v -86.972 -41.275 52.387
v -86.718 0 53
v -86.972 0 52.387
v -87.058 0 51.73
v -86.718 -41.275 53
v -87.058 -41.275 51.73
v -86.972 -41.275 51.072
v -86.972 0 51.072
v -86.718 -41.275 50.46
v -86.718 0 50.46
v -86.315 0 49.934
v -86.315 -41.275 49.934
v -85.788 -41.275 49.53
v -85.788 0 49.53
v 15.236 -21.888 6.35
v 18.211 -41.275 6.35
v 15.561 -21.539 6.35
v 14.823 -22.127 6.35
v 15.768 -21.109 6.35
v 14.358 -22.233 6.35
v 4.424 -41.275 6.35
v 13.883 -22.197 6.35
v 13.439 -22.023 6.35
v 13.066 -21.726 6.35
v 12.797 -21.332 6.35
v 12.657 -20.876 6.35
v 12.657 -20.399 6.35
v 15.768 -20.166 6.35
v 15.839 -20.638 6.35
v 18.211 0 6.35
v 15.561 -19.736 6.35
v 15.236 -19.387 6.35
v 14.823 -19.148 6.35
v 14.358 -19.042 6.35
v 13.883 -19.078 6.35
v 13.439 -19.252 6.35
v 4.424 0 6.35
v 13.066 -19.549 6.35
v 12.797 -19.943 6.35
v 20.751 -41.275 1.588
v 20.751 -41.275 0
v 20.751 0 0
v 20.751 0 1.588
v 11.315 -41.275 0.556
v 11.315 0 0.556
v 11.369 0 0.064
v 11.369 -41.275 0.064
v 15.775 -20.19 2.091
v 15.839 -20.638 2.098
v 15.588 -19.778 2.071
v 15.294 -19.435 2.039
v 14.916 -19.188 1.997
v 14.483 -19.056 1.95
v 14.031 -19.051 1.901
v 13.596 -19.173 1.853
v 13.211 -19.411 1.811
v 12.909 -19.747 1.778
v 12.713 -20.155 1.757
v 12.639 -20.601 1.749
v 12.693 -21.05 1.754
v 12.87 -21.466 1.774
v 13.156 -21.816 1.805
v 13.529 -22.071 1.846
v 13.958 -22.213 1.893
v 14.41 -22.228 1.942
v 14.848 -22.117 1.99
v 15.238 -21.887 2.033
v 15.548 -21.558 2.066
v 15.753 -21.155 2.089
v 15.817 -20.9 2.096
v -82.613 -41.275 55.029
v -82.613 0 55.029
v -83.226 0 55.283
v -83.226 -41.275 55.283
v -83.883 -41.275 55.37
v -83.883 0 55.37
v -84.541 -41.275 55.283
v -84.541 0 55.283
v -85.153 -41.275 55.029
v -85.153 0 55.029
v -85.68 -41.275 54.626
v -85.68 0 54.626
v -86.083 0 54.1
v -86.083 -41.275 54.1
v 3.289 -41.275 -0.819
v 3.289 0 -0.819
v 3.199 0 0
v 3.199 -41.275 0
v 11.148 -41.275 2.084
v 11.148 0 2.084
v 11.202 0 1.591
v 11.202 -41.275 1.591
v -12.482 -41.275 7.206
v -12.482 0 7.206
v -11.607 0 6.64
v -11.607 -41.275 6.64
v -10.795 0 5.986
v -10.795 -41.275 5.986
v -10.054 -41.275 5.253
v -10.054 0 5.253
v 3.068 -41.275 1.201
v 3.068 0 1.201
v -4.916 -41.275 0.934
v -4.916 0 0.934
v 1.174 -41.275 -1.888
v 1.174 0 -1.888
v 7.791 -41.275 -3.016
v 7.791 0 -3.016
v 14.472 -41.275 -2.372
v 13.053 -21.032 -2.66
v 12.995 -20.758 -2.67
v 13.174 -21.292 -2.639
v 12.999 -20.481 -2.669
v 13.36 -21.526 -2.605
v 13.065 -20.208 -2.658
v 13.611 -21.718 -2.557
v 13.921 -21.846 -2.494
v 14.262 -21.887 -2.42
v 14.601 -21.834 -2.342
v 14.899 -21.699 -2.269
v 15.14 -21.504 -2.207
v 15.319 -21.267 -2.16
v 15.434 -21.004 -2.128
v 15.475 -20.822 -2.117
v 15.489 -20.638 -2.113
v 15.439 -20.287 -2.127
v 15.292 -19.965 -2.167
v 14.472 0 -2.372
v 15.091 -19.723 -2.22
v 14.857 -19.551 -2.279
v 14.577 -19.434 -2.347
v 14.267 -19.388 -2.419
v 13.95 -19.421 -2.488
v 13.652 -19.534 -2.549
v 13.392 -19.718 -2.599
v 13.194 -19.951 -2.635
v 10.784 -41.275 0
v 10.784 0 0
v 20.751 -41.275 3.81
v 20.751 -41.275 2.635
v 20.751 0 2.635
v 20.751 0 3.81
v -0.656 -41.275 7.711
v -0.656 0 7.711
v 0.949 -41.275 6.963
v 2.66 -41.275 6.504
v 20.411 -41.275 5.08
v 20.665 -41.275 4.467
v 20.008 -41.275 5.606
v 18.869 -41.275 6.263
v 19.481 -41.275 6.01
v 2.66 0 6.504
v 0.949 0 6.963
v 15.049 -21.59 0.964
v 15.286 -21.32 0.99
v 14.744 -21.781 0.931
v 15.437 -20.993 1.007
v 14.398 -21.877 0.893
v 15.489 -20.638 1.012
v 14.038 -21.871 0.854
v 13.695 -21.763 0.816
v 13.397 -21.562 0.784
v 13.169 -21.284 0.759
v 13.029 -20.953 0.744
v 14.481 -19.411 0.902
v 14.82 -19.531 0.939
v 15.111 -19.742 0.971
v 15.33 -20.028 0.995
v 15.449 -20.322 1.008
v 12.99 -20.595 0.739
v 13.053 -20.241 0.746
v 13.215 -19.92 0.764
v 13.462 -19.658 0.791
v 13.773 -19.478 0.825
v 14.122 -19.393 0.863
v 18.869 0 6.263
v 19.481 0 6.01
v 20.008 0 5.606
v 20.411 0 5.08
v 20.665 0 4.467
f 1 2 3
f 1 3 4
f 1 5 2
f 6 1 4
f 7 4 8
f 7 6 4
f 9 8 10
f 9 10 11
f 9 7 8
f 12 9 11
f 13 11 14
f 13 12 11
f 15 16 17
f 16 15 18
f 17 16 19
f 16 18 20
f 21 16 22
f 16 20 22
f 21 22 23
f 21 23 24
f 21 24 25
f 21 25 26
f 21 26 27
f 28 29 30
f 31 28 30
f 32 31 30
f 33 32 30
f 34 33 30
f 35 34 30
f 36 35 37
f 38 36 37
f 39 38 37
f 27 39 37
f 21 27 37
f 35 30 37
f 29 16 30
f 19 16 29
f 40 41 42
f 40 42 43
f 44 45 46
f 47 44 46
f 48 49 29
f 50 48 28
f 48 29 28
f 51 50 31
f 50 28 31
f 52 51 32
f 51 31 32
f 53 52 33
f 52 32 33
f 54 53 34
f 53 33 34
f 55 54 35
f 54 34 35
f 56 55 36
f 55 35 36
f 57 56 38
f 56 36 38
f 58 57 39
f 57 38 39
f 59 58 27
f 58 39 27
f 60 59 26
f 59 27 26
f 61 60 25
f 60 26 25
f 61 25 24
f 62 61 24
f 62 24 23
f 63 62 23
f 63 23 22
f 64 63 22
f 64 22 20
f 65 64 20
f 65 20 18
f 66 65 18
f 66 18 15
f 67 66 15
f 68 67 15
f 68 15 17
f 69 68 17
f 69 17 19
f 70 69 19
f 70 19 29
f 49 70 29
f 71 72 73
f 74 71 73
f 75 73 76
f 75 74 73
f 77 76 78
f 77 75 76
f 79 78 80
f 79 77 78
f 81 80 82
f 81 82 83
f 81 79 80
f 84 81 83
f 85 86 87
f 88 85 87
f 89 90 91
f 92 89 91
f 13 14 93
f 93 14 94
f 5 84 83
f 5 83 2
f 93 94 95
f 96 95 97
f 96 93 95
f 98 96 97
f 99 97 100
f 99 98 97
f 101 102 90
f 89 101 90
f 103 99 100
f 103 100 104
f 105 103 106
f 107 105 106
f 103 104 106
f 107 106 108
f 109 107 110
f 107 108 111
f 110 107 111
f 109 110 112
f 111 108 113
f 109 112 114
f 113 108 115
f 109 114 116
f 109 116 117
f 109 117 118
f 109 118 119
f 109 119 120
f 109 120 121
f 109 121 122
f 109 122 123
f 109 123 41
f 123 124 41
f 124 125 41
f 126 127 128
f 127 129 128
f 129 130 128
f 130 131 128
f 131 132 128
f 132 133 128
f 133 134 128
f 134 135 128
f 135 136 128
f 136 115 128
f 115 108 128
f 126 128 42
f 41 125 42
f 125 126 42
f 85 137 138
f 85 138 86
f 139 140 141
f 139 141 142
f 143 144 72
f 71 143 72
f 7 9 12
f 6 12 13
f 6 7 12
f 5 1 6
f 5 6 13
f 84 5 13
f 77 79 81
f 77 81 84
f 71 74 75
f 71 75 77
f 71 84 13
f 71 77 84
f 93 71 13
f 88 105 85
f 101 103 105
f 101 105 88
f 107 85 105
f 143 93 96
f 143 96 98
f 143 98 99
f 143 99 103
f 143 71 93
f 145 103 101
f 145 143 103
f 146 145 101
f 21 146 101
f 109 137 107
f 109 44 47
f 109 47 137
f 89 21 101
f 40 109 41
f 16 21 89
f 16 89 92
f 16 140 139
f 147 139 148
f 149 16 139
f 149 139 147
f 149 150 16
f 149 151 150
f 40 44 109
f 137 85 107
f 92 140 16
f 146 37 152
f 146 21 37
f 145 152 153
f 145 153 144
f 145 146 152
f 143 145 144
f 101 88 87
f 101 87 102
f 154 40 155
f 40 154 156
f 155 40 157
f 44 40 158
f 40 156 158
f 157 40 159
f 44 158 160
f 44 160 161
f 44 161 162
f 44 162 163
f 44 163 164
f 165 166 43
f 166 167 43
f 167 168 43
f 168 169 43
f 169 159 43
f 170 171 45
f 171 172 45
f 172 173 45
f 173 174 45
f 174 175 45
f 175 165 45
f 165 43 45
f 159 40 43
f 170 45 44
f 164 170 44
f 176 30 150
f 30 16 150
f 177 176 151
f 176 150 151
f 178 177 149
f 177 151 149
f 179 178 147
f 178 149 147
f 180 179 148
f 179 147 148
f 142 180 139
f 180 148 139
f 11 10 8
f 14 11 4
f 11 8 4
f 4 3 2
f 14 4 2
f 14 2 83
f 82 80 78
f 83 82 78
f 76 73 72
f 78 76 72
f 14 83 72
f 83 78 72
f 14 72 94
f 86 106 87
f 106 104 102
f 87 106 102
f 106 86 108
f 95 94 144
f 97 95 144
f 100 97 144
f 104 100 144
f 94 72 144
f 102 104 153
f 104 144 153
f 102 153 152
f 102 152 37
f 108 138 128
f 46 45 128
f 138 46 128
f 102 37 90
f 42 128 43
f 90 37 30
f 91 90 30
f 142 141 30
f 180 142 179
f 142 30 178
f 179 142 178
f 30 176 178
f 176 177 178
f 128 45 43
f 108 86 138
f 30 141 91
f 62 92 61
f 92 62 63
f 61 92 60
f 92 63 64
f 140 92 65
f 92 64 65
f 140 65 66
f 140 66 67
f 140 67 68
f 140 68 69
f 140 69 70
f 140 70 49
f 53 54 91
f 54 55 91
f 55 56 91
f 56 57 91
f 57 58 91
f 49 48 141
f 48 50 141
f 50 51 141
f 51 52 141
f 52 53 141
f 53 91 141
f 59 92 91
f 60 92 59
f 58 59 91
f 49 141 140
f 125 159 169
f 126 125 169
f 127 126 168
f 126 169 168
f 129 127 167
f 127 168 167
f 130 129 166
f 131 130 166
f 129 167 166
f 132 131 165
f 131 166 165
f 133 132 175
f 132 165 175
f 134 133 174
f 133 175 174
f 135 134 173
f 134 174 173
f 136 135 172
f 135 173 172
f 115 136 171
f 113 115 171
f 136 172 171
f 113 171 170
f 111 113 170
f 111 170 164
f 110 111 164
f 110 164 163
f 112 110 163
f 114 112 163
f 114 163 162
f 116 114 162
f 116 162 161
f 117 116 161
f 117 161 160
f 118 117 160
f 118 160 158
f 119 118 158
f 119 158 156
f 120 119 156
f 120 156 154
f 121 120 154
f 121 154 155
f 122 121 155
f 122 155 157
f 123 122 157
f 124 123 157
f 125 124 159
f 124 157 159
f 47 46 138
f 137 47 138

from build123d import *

# Parameters (mm, degrees)
F1_DEPTH = 41.275
F2_R     = 1.6
F2_R_2   = 1.25
F3_DEPTH = 4.6024929371
F4_DEPTH = 9.3840608367
F6_R     = 10.16
F7_R     = 2.54


with BuildPart() as f1:
    # F0 (on Front) → F1 (new body)
    with BuildSketch(Plane.XZ):
        Polygon((-10.9985226281, 6.35), (0, 0), (3.1994554543, 0), (3.0682228412, 1.200819531), (11.1481153525, 2.0838376541), (11.2019242694, 1.5914692042), (20.7514773719, 2.6351004709), (20.7514773719, 6.35), (1.7014773719, 6.35), (-84.8131810245, 56.299261314), (-87.9881810245, 50.8), align=None)
        with BuildLine():
            Line((3.1994554543, 0), (0, 0))
            Line((0, 0), (-10.9985226281, 6.35))
            ThreePointArc((-10.9985226281, 6.35), (3.7335153721, -2.5398099993), (20.7514773719, 0))
            Line((20.7514773719, 0), (10.7844894565, 0))
            Line((10.7844894565, 0), (3.2889773719, -0.8191535968))
            Line((3.2889773719, -0.8191535968), (3.1994554543, 0))
        make_face()
        Polygon((10.7844894565, 0), (20.7514773719, 0), (20.7514773719, 1.5875), (11.3150609664, 0.5562329762), (11.3688698832, 0.0638645263), align=None)
    extrude(amount=F1_DEPTH)

    # F2 (on face) → F3 (cut, through all)
    with BuildSketch(Plane.XY.offset(6.35)):
        with Locations((14.2388698832, -20.6375)):
            Circle(F2_R)
        with Locations((14.2388698832, -20.6375)):
            Circle(F2_R_2, mode=Mode.SUBTRACT)
        with Locations((14.2388698832, -20.6375)):
            Circle(F2_R_2)
    extrude(amount=-F3_DEPTH, mode=Mode.SUBTRACT)

    # F2 (on face) → F4 (cut, through all)
    with BuildSketch(Plane.XY.offset(6.35)):
        with Locations((14.2388698832, -20.6375)):
            Circle(F2_R_2)
    extrude(amount=-F4_DEPTH, mode=Mode.SUBTRACT)

    # F6
    f6_edges = [f1.edges().sort_by_distance(p)[0] for p in [
        (-10.998523, -20.6375, 6.35),
        (1.701477, -20.6375, 6.35),
    ]]
    fillet(f6_edges, radius=F6_R)

    # F7
    f7_edges = [f1.edges().sort_by_distance(p)[0] for p in [
        (-87.988181, -20.6375, 50.8),
        (-84.813181, -20.6375, 56.299261),
        (20.751477, -20.6375, 6.35),
    ]]
    fillet(f7_edges, radius=F7_R)


solid = f1.part
